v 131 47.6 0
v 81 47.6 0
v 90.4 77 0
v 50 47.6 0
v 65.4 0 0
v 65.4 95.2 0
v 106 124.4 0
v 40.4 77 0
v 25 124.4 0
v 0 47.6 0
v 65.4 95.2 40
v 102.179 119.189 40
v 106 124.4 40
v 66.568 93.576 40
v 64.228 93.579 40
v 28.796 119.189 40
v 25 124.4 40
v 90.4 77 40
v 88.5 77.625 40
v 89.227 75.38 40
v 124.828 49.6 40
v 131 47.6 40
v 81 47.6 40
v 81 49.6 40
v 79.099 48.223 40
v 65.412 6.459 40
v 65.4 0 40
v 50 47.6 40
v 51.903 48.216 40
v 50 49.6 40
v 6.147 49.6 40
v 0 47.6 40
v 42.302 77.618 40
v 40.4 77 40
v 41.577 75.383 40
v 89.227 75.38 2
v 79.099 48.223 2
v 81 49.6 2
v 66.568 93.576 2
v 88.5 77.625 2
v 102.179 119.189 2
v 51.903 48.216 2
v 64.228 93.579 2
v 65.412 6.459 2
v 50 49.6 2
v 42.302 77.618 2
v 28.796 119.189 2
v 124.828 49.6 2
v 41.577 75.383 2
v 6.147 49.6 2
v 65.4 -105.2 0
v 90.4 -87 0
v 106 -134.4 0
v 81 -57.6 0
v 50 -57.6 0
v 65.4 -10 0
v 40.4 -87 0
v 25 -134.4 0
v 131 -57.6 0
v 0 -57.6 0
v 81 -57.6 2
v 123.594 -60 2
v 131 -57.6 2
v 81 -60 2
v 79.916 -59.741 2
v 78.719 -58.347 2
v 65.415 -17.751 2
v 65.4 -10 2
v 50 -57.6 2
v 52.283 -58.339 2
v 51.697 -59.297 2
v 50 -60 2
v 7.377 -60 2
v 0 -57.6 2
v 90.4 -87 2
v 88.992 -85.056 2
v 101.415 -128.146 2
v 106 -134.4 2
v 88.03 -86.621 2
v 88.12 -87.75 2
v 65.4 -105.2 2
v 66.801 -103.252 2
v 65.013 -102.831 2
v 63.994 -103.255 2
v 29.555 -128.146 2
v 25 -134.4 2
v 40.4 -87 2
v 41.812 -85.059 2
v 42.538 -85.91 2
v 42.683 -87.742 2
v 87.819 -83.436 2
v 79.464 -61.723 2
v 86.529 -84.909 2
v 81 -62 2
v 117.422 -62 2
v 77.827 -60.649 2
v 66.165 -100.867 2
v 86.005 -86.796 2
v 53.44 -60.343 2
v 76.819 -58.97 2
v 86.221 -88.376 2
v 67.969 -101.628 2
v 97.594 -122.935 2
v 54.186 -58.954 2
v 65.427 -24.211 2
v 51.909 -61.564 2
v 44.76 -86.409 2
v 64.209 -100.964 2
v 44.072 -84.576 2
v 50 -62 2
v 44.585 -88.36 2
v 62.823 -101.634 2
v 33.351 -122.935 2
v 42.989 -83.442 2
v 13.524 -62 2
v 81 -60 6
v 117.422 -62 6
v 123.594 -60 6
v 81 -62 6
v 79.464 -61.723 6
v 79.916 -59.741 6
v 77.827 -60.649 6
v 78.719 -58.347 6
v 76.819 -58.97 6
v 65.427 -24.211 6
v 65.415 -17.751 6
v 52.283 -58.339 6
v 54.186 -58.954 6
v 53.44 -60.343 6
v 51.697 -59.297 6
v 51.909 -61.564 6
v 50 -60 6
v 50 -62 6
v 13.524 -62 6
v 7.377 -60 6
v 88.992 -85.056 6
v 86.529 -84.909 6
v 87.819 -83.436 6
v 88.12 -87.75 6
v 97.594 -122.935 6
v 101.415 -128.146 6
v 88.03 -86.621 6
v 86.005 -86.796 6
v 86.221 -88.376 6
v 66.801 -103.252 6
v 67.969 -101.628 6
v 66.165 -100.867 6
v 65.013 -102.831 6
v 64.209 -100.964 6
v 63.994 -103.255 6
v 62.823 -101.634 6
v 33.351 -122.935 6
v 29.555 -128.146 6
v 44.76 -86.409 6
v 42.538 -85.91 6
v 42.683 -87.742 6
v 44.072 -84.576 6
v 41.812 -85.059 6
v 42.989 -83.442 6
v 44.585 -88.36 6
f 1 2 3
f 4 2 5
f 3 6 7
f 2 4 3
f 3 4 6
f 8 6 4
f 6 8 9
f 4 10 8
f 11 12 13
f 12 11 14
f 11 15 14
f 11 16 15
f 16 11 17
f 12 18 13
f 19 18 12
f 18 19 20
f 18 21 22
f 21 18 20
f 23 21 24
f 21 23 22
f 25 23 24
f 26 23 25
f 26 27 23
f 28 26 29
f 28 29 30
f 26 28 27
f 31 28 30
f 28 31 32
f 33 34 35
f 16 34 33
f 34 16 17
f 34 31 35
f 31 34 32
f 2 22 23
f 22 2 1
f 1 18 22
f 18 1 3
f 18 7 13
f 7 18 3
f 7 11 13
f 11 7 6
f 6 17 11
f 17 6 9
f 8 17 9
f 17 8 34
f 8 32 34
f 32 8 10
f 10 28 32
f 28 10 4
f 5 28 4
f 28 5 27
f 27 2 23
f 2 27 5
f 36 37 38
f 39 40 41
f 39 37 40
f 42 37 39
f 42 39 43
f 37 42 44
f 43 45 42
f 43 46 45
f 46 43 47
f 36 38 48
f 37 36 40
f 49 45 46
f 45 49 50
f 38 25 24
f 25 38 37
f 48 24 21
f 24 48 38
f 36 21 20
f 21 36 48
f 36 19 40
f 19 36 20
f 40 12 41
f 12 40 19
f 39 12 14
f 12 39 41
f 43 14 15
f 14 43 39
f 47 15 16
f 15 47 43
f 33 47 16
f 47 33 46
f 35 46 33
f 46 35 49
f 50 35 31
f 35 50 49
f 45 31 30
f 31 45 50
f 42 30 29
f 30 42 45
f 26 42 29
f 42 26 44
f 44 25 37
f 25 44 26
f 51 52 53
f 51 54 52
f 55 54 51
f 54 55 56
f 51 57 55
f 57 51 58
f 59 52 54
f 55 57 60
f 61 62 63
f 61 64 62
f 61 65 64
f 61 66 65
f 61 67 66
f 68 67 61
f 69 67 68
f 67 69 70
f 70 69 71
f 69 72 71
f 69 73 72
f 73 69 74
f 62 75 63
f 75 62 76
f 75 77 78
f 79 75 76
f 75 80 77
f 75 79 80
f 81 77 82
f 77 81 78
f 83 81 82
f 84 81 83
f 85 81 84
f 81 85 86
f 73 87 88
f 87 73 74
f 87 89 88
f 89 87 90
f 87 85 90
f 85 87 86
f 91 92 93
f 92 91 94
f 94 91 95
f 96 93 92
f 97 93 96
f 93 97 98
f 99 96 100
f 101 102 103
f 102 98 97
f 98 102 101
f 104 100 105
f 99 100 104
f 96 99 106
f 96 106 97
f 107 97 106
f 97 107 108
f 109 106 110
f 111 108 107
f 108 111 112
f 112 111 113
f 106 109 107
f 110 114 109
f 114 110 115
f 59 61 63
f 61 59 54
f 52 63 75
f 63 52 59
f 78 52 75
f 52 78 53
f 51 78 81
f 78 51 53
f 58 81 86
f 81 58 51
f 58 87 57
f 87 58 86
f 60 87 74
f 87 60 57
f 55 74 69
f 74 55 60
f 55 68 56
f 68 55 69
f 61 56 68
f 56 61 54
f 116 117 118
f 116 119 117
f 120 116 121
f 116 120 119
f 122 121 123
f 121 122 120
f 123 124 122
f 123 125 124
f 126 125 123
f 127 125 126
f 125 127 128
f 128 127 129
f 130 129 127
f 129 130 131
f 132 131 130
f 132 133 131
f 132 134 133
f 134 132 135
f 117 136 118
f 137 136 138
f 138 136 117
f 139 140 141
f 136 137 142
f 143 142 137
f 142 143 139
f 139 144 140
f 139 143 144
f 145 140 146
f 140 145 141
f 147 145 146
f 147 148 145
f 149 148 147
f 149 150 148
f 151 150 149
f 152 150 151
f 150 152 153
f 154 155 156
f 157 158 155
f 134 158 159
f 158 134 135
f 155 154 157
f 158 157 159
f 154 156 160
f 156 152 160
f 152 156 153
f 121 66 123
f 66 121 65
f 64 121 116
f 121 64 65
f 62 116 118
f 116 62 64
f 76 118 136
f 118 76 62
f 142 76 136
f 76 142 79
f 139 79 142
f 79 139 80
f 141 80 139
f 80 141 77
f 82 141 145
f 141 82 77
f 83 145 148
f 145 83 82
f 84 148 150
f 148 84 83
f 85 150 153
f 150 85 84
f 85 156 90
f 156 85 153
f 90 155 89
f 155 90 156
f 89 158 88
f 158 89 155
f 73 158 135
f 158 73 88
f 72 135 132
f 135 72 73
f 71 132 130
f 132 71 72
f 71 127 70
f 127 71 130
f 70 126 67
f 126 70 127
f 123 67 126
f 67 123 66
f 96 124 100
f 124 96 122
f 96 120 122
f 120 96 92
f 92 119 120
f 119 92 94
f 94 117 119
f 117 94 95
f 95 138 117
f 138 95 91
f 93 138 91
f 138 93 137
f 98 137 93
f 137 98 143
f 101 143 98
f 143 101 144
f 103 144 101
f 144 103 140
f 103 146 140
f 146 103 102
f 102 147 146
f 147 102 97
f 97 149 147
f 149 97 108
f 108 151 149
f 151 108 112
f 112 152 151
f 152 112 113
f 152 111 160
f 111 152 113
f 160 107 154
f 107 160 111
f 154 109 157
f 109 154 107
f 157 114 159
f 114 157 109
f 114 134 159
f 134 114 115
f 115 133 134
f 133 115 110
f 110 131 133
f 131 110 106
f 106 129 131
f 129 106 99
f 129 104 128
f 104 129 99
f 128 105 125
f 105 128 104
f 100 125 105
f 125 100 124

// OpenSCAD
/* [Global] */
// Which one would you like to see?
part = "both"; // [box:Box Only,lid:Lid Only,both:Box and Lid]

/* [Main Structure] */
//need to define a valid shape by it's points [[x1,y1],[x2,y2],[x3,y3]] - remember to have 2 sets of square brackets at begining and end
myvector=[[0,23.8],[20.2,38.5],[12.5,62.2],[32.7, 47.6],[53,62.2],[45.2,38.5],[65.5,23.8],[40.5,23.8],[32.7,0],[25,23.8]]; //star


//Factor to scale shape up by incase your vector points are the wrong size
scalefactor=2;
myscaledvector=myvector*scalefactor;
//Overall height of box
depth=40;
//thickness of base
base=2;
//thickness of wall
wall=2;

/* [Lid Structure] */
//height of lid
liddepth=2;
//height of internal lip
lipdepth=4;
//width of internal lip
lipwidth=2;
//clearance between lip and wall
clearance = 0.4;

/* [Hidden] */
//myvector=[[0,0],[5,5],[10,15],[5,20],[10,25],[5,35],[4,55],[0,60],[-4,55],[-5,35],[-10,25],[-5,20],[-10,15],[-5,5]];  //random
//myvector=[[0,0],[0,10],[10,10],[10,0]]; //square
//myvector=[[0,0],[20,0],[10,sin(60)*20]];  //triangle
//myvector=[[25,50],[34,40],[29,40],[36, 30],[31,30],[38,20],[33,20],[42,7],[30,7],[30,0],[20,0],[20,7],[8,7],[17,20],[12,20],[19,30],[14,30],[21,40],[16,40]]; //christmas tree
//myvector=[[28,12],[27,9],[26,7],[27,4],[24,6],[18,5],[17,3],[15,4],[10,4],[8,5],[8,0],[6,2],[5,5],[1,6],[3,7],[0,8],[2,9],[5,10],[10,10],[12,14],[14,10],[17,9],[23,8],[28,12]]; //shark
//myvector=[[-1,6],[-1,4],[-0.5,3],[0.5,3],[1,4],[1,6],[2,4],[3,3],[5,3.5],[7,5],[8,7],[7,10],[5,13],[7,16],[8,19],[8,21],[7.6,22],[7,23],[6,23.7],[4,23],[3,22],[2,20],[1,17],[1,18],[0.5,19],[-0.5,19],[-1,18],[-1,17],[-2,20],[-3,22],[-4,23],[-6,23.7],[-7,23],[-7.6,22],[-8,21],[-8,19],[-7,16],[-5,13],[-7,10],[-8,7],[-7,5],[-5,3.5],[-3,3],[-2,4]]; //butterfly
//myvector=[[0,23.8],[20.2,38.5],[12.5,62.2],[32.7, 47.6],[53,62.2],[45.2,38.5],[65.5,23.8],[40.5,23.8],[32.7,0],[25,23.8]]; //star

module doshape(depth1,depth2){
difference(){
linear_extrude(height=depth1) polygon(points=myscaledvector);
translate([0,0,base]) linear_extrude(height=depth2) offset(r=-wall) polygon(points=myscaledvector);
}
}

module dolip(depth1,off1,off2){
difference(){
    translate([0,0,0]) linear_extrude(height=depth1) offset(r=-off1) polygon(points=myscaledvector);
    translate([0,0,0]) linear_extrude(height=depth1+0.01) offset(r=-off2) polygon(points=myscaledvector);
}
}

module makebox(){
    doshape(depth,depth-base+0.01);
}

module makelid(){
    translate([0,-10,0]) mirror([0,1,0]) doshape(liddepth,0);
    translate([0,-10,liddepth]) mirror([0,1,0]) dolip(lipdepth,wall+clearance,wall+clearance+lipwidth);
}

module both() {
	makebox();
	makelid();
}

module print_part() {
	if (part == "box") {
		makebox();
	} else if (part == "lid") {
		makelid();
	} else if (part == "both") {
		both();
	} else {
		both();
	}
}

print_part();
